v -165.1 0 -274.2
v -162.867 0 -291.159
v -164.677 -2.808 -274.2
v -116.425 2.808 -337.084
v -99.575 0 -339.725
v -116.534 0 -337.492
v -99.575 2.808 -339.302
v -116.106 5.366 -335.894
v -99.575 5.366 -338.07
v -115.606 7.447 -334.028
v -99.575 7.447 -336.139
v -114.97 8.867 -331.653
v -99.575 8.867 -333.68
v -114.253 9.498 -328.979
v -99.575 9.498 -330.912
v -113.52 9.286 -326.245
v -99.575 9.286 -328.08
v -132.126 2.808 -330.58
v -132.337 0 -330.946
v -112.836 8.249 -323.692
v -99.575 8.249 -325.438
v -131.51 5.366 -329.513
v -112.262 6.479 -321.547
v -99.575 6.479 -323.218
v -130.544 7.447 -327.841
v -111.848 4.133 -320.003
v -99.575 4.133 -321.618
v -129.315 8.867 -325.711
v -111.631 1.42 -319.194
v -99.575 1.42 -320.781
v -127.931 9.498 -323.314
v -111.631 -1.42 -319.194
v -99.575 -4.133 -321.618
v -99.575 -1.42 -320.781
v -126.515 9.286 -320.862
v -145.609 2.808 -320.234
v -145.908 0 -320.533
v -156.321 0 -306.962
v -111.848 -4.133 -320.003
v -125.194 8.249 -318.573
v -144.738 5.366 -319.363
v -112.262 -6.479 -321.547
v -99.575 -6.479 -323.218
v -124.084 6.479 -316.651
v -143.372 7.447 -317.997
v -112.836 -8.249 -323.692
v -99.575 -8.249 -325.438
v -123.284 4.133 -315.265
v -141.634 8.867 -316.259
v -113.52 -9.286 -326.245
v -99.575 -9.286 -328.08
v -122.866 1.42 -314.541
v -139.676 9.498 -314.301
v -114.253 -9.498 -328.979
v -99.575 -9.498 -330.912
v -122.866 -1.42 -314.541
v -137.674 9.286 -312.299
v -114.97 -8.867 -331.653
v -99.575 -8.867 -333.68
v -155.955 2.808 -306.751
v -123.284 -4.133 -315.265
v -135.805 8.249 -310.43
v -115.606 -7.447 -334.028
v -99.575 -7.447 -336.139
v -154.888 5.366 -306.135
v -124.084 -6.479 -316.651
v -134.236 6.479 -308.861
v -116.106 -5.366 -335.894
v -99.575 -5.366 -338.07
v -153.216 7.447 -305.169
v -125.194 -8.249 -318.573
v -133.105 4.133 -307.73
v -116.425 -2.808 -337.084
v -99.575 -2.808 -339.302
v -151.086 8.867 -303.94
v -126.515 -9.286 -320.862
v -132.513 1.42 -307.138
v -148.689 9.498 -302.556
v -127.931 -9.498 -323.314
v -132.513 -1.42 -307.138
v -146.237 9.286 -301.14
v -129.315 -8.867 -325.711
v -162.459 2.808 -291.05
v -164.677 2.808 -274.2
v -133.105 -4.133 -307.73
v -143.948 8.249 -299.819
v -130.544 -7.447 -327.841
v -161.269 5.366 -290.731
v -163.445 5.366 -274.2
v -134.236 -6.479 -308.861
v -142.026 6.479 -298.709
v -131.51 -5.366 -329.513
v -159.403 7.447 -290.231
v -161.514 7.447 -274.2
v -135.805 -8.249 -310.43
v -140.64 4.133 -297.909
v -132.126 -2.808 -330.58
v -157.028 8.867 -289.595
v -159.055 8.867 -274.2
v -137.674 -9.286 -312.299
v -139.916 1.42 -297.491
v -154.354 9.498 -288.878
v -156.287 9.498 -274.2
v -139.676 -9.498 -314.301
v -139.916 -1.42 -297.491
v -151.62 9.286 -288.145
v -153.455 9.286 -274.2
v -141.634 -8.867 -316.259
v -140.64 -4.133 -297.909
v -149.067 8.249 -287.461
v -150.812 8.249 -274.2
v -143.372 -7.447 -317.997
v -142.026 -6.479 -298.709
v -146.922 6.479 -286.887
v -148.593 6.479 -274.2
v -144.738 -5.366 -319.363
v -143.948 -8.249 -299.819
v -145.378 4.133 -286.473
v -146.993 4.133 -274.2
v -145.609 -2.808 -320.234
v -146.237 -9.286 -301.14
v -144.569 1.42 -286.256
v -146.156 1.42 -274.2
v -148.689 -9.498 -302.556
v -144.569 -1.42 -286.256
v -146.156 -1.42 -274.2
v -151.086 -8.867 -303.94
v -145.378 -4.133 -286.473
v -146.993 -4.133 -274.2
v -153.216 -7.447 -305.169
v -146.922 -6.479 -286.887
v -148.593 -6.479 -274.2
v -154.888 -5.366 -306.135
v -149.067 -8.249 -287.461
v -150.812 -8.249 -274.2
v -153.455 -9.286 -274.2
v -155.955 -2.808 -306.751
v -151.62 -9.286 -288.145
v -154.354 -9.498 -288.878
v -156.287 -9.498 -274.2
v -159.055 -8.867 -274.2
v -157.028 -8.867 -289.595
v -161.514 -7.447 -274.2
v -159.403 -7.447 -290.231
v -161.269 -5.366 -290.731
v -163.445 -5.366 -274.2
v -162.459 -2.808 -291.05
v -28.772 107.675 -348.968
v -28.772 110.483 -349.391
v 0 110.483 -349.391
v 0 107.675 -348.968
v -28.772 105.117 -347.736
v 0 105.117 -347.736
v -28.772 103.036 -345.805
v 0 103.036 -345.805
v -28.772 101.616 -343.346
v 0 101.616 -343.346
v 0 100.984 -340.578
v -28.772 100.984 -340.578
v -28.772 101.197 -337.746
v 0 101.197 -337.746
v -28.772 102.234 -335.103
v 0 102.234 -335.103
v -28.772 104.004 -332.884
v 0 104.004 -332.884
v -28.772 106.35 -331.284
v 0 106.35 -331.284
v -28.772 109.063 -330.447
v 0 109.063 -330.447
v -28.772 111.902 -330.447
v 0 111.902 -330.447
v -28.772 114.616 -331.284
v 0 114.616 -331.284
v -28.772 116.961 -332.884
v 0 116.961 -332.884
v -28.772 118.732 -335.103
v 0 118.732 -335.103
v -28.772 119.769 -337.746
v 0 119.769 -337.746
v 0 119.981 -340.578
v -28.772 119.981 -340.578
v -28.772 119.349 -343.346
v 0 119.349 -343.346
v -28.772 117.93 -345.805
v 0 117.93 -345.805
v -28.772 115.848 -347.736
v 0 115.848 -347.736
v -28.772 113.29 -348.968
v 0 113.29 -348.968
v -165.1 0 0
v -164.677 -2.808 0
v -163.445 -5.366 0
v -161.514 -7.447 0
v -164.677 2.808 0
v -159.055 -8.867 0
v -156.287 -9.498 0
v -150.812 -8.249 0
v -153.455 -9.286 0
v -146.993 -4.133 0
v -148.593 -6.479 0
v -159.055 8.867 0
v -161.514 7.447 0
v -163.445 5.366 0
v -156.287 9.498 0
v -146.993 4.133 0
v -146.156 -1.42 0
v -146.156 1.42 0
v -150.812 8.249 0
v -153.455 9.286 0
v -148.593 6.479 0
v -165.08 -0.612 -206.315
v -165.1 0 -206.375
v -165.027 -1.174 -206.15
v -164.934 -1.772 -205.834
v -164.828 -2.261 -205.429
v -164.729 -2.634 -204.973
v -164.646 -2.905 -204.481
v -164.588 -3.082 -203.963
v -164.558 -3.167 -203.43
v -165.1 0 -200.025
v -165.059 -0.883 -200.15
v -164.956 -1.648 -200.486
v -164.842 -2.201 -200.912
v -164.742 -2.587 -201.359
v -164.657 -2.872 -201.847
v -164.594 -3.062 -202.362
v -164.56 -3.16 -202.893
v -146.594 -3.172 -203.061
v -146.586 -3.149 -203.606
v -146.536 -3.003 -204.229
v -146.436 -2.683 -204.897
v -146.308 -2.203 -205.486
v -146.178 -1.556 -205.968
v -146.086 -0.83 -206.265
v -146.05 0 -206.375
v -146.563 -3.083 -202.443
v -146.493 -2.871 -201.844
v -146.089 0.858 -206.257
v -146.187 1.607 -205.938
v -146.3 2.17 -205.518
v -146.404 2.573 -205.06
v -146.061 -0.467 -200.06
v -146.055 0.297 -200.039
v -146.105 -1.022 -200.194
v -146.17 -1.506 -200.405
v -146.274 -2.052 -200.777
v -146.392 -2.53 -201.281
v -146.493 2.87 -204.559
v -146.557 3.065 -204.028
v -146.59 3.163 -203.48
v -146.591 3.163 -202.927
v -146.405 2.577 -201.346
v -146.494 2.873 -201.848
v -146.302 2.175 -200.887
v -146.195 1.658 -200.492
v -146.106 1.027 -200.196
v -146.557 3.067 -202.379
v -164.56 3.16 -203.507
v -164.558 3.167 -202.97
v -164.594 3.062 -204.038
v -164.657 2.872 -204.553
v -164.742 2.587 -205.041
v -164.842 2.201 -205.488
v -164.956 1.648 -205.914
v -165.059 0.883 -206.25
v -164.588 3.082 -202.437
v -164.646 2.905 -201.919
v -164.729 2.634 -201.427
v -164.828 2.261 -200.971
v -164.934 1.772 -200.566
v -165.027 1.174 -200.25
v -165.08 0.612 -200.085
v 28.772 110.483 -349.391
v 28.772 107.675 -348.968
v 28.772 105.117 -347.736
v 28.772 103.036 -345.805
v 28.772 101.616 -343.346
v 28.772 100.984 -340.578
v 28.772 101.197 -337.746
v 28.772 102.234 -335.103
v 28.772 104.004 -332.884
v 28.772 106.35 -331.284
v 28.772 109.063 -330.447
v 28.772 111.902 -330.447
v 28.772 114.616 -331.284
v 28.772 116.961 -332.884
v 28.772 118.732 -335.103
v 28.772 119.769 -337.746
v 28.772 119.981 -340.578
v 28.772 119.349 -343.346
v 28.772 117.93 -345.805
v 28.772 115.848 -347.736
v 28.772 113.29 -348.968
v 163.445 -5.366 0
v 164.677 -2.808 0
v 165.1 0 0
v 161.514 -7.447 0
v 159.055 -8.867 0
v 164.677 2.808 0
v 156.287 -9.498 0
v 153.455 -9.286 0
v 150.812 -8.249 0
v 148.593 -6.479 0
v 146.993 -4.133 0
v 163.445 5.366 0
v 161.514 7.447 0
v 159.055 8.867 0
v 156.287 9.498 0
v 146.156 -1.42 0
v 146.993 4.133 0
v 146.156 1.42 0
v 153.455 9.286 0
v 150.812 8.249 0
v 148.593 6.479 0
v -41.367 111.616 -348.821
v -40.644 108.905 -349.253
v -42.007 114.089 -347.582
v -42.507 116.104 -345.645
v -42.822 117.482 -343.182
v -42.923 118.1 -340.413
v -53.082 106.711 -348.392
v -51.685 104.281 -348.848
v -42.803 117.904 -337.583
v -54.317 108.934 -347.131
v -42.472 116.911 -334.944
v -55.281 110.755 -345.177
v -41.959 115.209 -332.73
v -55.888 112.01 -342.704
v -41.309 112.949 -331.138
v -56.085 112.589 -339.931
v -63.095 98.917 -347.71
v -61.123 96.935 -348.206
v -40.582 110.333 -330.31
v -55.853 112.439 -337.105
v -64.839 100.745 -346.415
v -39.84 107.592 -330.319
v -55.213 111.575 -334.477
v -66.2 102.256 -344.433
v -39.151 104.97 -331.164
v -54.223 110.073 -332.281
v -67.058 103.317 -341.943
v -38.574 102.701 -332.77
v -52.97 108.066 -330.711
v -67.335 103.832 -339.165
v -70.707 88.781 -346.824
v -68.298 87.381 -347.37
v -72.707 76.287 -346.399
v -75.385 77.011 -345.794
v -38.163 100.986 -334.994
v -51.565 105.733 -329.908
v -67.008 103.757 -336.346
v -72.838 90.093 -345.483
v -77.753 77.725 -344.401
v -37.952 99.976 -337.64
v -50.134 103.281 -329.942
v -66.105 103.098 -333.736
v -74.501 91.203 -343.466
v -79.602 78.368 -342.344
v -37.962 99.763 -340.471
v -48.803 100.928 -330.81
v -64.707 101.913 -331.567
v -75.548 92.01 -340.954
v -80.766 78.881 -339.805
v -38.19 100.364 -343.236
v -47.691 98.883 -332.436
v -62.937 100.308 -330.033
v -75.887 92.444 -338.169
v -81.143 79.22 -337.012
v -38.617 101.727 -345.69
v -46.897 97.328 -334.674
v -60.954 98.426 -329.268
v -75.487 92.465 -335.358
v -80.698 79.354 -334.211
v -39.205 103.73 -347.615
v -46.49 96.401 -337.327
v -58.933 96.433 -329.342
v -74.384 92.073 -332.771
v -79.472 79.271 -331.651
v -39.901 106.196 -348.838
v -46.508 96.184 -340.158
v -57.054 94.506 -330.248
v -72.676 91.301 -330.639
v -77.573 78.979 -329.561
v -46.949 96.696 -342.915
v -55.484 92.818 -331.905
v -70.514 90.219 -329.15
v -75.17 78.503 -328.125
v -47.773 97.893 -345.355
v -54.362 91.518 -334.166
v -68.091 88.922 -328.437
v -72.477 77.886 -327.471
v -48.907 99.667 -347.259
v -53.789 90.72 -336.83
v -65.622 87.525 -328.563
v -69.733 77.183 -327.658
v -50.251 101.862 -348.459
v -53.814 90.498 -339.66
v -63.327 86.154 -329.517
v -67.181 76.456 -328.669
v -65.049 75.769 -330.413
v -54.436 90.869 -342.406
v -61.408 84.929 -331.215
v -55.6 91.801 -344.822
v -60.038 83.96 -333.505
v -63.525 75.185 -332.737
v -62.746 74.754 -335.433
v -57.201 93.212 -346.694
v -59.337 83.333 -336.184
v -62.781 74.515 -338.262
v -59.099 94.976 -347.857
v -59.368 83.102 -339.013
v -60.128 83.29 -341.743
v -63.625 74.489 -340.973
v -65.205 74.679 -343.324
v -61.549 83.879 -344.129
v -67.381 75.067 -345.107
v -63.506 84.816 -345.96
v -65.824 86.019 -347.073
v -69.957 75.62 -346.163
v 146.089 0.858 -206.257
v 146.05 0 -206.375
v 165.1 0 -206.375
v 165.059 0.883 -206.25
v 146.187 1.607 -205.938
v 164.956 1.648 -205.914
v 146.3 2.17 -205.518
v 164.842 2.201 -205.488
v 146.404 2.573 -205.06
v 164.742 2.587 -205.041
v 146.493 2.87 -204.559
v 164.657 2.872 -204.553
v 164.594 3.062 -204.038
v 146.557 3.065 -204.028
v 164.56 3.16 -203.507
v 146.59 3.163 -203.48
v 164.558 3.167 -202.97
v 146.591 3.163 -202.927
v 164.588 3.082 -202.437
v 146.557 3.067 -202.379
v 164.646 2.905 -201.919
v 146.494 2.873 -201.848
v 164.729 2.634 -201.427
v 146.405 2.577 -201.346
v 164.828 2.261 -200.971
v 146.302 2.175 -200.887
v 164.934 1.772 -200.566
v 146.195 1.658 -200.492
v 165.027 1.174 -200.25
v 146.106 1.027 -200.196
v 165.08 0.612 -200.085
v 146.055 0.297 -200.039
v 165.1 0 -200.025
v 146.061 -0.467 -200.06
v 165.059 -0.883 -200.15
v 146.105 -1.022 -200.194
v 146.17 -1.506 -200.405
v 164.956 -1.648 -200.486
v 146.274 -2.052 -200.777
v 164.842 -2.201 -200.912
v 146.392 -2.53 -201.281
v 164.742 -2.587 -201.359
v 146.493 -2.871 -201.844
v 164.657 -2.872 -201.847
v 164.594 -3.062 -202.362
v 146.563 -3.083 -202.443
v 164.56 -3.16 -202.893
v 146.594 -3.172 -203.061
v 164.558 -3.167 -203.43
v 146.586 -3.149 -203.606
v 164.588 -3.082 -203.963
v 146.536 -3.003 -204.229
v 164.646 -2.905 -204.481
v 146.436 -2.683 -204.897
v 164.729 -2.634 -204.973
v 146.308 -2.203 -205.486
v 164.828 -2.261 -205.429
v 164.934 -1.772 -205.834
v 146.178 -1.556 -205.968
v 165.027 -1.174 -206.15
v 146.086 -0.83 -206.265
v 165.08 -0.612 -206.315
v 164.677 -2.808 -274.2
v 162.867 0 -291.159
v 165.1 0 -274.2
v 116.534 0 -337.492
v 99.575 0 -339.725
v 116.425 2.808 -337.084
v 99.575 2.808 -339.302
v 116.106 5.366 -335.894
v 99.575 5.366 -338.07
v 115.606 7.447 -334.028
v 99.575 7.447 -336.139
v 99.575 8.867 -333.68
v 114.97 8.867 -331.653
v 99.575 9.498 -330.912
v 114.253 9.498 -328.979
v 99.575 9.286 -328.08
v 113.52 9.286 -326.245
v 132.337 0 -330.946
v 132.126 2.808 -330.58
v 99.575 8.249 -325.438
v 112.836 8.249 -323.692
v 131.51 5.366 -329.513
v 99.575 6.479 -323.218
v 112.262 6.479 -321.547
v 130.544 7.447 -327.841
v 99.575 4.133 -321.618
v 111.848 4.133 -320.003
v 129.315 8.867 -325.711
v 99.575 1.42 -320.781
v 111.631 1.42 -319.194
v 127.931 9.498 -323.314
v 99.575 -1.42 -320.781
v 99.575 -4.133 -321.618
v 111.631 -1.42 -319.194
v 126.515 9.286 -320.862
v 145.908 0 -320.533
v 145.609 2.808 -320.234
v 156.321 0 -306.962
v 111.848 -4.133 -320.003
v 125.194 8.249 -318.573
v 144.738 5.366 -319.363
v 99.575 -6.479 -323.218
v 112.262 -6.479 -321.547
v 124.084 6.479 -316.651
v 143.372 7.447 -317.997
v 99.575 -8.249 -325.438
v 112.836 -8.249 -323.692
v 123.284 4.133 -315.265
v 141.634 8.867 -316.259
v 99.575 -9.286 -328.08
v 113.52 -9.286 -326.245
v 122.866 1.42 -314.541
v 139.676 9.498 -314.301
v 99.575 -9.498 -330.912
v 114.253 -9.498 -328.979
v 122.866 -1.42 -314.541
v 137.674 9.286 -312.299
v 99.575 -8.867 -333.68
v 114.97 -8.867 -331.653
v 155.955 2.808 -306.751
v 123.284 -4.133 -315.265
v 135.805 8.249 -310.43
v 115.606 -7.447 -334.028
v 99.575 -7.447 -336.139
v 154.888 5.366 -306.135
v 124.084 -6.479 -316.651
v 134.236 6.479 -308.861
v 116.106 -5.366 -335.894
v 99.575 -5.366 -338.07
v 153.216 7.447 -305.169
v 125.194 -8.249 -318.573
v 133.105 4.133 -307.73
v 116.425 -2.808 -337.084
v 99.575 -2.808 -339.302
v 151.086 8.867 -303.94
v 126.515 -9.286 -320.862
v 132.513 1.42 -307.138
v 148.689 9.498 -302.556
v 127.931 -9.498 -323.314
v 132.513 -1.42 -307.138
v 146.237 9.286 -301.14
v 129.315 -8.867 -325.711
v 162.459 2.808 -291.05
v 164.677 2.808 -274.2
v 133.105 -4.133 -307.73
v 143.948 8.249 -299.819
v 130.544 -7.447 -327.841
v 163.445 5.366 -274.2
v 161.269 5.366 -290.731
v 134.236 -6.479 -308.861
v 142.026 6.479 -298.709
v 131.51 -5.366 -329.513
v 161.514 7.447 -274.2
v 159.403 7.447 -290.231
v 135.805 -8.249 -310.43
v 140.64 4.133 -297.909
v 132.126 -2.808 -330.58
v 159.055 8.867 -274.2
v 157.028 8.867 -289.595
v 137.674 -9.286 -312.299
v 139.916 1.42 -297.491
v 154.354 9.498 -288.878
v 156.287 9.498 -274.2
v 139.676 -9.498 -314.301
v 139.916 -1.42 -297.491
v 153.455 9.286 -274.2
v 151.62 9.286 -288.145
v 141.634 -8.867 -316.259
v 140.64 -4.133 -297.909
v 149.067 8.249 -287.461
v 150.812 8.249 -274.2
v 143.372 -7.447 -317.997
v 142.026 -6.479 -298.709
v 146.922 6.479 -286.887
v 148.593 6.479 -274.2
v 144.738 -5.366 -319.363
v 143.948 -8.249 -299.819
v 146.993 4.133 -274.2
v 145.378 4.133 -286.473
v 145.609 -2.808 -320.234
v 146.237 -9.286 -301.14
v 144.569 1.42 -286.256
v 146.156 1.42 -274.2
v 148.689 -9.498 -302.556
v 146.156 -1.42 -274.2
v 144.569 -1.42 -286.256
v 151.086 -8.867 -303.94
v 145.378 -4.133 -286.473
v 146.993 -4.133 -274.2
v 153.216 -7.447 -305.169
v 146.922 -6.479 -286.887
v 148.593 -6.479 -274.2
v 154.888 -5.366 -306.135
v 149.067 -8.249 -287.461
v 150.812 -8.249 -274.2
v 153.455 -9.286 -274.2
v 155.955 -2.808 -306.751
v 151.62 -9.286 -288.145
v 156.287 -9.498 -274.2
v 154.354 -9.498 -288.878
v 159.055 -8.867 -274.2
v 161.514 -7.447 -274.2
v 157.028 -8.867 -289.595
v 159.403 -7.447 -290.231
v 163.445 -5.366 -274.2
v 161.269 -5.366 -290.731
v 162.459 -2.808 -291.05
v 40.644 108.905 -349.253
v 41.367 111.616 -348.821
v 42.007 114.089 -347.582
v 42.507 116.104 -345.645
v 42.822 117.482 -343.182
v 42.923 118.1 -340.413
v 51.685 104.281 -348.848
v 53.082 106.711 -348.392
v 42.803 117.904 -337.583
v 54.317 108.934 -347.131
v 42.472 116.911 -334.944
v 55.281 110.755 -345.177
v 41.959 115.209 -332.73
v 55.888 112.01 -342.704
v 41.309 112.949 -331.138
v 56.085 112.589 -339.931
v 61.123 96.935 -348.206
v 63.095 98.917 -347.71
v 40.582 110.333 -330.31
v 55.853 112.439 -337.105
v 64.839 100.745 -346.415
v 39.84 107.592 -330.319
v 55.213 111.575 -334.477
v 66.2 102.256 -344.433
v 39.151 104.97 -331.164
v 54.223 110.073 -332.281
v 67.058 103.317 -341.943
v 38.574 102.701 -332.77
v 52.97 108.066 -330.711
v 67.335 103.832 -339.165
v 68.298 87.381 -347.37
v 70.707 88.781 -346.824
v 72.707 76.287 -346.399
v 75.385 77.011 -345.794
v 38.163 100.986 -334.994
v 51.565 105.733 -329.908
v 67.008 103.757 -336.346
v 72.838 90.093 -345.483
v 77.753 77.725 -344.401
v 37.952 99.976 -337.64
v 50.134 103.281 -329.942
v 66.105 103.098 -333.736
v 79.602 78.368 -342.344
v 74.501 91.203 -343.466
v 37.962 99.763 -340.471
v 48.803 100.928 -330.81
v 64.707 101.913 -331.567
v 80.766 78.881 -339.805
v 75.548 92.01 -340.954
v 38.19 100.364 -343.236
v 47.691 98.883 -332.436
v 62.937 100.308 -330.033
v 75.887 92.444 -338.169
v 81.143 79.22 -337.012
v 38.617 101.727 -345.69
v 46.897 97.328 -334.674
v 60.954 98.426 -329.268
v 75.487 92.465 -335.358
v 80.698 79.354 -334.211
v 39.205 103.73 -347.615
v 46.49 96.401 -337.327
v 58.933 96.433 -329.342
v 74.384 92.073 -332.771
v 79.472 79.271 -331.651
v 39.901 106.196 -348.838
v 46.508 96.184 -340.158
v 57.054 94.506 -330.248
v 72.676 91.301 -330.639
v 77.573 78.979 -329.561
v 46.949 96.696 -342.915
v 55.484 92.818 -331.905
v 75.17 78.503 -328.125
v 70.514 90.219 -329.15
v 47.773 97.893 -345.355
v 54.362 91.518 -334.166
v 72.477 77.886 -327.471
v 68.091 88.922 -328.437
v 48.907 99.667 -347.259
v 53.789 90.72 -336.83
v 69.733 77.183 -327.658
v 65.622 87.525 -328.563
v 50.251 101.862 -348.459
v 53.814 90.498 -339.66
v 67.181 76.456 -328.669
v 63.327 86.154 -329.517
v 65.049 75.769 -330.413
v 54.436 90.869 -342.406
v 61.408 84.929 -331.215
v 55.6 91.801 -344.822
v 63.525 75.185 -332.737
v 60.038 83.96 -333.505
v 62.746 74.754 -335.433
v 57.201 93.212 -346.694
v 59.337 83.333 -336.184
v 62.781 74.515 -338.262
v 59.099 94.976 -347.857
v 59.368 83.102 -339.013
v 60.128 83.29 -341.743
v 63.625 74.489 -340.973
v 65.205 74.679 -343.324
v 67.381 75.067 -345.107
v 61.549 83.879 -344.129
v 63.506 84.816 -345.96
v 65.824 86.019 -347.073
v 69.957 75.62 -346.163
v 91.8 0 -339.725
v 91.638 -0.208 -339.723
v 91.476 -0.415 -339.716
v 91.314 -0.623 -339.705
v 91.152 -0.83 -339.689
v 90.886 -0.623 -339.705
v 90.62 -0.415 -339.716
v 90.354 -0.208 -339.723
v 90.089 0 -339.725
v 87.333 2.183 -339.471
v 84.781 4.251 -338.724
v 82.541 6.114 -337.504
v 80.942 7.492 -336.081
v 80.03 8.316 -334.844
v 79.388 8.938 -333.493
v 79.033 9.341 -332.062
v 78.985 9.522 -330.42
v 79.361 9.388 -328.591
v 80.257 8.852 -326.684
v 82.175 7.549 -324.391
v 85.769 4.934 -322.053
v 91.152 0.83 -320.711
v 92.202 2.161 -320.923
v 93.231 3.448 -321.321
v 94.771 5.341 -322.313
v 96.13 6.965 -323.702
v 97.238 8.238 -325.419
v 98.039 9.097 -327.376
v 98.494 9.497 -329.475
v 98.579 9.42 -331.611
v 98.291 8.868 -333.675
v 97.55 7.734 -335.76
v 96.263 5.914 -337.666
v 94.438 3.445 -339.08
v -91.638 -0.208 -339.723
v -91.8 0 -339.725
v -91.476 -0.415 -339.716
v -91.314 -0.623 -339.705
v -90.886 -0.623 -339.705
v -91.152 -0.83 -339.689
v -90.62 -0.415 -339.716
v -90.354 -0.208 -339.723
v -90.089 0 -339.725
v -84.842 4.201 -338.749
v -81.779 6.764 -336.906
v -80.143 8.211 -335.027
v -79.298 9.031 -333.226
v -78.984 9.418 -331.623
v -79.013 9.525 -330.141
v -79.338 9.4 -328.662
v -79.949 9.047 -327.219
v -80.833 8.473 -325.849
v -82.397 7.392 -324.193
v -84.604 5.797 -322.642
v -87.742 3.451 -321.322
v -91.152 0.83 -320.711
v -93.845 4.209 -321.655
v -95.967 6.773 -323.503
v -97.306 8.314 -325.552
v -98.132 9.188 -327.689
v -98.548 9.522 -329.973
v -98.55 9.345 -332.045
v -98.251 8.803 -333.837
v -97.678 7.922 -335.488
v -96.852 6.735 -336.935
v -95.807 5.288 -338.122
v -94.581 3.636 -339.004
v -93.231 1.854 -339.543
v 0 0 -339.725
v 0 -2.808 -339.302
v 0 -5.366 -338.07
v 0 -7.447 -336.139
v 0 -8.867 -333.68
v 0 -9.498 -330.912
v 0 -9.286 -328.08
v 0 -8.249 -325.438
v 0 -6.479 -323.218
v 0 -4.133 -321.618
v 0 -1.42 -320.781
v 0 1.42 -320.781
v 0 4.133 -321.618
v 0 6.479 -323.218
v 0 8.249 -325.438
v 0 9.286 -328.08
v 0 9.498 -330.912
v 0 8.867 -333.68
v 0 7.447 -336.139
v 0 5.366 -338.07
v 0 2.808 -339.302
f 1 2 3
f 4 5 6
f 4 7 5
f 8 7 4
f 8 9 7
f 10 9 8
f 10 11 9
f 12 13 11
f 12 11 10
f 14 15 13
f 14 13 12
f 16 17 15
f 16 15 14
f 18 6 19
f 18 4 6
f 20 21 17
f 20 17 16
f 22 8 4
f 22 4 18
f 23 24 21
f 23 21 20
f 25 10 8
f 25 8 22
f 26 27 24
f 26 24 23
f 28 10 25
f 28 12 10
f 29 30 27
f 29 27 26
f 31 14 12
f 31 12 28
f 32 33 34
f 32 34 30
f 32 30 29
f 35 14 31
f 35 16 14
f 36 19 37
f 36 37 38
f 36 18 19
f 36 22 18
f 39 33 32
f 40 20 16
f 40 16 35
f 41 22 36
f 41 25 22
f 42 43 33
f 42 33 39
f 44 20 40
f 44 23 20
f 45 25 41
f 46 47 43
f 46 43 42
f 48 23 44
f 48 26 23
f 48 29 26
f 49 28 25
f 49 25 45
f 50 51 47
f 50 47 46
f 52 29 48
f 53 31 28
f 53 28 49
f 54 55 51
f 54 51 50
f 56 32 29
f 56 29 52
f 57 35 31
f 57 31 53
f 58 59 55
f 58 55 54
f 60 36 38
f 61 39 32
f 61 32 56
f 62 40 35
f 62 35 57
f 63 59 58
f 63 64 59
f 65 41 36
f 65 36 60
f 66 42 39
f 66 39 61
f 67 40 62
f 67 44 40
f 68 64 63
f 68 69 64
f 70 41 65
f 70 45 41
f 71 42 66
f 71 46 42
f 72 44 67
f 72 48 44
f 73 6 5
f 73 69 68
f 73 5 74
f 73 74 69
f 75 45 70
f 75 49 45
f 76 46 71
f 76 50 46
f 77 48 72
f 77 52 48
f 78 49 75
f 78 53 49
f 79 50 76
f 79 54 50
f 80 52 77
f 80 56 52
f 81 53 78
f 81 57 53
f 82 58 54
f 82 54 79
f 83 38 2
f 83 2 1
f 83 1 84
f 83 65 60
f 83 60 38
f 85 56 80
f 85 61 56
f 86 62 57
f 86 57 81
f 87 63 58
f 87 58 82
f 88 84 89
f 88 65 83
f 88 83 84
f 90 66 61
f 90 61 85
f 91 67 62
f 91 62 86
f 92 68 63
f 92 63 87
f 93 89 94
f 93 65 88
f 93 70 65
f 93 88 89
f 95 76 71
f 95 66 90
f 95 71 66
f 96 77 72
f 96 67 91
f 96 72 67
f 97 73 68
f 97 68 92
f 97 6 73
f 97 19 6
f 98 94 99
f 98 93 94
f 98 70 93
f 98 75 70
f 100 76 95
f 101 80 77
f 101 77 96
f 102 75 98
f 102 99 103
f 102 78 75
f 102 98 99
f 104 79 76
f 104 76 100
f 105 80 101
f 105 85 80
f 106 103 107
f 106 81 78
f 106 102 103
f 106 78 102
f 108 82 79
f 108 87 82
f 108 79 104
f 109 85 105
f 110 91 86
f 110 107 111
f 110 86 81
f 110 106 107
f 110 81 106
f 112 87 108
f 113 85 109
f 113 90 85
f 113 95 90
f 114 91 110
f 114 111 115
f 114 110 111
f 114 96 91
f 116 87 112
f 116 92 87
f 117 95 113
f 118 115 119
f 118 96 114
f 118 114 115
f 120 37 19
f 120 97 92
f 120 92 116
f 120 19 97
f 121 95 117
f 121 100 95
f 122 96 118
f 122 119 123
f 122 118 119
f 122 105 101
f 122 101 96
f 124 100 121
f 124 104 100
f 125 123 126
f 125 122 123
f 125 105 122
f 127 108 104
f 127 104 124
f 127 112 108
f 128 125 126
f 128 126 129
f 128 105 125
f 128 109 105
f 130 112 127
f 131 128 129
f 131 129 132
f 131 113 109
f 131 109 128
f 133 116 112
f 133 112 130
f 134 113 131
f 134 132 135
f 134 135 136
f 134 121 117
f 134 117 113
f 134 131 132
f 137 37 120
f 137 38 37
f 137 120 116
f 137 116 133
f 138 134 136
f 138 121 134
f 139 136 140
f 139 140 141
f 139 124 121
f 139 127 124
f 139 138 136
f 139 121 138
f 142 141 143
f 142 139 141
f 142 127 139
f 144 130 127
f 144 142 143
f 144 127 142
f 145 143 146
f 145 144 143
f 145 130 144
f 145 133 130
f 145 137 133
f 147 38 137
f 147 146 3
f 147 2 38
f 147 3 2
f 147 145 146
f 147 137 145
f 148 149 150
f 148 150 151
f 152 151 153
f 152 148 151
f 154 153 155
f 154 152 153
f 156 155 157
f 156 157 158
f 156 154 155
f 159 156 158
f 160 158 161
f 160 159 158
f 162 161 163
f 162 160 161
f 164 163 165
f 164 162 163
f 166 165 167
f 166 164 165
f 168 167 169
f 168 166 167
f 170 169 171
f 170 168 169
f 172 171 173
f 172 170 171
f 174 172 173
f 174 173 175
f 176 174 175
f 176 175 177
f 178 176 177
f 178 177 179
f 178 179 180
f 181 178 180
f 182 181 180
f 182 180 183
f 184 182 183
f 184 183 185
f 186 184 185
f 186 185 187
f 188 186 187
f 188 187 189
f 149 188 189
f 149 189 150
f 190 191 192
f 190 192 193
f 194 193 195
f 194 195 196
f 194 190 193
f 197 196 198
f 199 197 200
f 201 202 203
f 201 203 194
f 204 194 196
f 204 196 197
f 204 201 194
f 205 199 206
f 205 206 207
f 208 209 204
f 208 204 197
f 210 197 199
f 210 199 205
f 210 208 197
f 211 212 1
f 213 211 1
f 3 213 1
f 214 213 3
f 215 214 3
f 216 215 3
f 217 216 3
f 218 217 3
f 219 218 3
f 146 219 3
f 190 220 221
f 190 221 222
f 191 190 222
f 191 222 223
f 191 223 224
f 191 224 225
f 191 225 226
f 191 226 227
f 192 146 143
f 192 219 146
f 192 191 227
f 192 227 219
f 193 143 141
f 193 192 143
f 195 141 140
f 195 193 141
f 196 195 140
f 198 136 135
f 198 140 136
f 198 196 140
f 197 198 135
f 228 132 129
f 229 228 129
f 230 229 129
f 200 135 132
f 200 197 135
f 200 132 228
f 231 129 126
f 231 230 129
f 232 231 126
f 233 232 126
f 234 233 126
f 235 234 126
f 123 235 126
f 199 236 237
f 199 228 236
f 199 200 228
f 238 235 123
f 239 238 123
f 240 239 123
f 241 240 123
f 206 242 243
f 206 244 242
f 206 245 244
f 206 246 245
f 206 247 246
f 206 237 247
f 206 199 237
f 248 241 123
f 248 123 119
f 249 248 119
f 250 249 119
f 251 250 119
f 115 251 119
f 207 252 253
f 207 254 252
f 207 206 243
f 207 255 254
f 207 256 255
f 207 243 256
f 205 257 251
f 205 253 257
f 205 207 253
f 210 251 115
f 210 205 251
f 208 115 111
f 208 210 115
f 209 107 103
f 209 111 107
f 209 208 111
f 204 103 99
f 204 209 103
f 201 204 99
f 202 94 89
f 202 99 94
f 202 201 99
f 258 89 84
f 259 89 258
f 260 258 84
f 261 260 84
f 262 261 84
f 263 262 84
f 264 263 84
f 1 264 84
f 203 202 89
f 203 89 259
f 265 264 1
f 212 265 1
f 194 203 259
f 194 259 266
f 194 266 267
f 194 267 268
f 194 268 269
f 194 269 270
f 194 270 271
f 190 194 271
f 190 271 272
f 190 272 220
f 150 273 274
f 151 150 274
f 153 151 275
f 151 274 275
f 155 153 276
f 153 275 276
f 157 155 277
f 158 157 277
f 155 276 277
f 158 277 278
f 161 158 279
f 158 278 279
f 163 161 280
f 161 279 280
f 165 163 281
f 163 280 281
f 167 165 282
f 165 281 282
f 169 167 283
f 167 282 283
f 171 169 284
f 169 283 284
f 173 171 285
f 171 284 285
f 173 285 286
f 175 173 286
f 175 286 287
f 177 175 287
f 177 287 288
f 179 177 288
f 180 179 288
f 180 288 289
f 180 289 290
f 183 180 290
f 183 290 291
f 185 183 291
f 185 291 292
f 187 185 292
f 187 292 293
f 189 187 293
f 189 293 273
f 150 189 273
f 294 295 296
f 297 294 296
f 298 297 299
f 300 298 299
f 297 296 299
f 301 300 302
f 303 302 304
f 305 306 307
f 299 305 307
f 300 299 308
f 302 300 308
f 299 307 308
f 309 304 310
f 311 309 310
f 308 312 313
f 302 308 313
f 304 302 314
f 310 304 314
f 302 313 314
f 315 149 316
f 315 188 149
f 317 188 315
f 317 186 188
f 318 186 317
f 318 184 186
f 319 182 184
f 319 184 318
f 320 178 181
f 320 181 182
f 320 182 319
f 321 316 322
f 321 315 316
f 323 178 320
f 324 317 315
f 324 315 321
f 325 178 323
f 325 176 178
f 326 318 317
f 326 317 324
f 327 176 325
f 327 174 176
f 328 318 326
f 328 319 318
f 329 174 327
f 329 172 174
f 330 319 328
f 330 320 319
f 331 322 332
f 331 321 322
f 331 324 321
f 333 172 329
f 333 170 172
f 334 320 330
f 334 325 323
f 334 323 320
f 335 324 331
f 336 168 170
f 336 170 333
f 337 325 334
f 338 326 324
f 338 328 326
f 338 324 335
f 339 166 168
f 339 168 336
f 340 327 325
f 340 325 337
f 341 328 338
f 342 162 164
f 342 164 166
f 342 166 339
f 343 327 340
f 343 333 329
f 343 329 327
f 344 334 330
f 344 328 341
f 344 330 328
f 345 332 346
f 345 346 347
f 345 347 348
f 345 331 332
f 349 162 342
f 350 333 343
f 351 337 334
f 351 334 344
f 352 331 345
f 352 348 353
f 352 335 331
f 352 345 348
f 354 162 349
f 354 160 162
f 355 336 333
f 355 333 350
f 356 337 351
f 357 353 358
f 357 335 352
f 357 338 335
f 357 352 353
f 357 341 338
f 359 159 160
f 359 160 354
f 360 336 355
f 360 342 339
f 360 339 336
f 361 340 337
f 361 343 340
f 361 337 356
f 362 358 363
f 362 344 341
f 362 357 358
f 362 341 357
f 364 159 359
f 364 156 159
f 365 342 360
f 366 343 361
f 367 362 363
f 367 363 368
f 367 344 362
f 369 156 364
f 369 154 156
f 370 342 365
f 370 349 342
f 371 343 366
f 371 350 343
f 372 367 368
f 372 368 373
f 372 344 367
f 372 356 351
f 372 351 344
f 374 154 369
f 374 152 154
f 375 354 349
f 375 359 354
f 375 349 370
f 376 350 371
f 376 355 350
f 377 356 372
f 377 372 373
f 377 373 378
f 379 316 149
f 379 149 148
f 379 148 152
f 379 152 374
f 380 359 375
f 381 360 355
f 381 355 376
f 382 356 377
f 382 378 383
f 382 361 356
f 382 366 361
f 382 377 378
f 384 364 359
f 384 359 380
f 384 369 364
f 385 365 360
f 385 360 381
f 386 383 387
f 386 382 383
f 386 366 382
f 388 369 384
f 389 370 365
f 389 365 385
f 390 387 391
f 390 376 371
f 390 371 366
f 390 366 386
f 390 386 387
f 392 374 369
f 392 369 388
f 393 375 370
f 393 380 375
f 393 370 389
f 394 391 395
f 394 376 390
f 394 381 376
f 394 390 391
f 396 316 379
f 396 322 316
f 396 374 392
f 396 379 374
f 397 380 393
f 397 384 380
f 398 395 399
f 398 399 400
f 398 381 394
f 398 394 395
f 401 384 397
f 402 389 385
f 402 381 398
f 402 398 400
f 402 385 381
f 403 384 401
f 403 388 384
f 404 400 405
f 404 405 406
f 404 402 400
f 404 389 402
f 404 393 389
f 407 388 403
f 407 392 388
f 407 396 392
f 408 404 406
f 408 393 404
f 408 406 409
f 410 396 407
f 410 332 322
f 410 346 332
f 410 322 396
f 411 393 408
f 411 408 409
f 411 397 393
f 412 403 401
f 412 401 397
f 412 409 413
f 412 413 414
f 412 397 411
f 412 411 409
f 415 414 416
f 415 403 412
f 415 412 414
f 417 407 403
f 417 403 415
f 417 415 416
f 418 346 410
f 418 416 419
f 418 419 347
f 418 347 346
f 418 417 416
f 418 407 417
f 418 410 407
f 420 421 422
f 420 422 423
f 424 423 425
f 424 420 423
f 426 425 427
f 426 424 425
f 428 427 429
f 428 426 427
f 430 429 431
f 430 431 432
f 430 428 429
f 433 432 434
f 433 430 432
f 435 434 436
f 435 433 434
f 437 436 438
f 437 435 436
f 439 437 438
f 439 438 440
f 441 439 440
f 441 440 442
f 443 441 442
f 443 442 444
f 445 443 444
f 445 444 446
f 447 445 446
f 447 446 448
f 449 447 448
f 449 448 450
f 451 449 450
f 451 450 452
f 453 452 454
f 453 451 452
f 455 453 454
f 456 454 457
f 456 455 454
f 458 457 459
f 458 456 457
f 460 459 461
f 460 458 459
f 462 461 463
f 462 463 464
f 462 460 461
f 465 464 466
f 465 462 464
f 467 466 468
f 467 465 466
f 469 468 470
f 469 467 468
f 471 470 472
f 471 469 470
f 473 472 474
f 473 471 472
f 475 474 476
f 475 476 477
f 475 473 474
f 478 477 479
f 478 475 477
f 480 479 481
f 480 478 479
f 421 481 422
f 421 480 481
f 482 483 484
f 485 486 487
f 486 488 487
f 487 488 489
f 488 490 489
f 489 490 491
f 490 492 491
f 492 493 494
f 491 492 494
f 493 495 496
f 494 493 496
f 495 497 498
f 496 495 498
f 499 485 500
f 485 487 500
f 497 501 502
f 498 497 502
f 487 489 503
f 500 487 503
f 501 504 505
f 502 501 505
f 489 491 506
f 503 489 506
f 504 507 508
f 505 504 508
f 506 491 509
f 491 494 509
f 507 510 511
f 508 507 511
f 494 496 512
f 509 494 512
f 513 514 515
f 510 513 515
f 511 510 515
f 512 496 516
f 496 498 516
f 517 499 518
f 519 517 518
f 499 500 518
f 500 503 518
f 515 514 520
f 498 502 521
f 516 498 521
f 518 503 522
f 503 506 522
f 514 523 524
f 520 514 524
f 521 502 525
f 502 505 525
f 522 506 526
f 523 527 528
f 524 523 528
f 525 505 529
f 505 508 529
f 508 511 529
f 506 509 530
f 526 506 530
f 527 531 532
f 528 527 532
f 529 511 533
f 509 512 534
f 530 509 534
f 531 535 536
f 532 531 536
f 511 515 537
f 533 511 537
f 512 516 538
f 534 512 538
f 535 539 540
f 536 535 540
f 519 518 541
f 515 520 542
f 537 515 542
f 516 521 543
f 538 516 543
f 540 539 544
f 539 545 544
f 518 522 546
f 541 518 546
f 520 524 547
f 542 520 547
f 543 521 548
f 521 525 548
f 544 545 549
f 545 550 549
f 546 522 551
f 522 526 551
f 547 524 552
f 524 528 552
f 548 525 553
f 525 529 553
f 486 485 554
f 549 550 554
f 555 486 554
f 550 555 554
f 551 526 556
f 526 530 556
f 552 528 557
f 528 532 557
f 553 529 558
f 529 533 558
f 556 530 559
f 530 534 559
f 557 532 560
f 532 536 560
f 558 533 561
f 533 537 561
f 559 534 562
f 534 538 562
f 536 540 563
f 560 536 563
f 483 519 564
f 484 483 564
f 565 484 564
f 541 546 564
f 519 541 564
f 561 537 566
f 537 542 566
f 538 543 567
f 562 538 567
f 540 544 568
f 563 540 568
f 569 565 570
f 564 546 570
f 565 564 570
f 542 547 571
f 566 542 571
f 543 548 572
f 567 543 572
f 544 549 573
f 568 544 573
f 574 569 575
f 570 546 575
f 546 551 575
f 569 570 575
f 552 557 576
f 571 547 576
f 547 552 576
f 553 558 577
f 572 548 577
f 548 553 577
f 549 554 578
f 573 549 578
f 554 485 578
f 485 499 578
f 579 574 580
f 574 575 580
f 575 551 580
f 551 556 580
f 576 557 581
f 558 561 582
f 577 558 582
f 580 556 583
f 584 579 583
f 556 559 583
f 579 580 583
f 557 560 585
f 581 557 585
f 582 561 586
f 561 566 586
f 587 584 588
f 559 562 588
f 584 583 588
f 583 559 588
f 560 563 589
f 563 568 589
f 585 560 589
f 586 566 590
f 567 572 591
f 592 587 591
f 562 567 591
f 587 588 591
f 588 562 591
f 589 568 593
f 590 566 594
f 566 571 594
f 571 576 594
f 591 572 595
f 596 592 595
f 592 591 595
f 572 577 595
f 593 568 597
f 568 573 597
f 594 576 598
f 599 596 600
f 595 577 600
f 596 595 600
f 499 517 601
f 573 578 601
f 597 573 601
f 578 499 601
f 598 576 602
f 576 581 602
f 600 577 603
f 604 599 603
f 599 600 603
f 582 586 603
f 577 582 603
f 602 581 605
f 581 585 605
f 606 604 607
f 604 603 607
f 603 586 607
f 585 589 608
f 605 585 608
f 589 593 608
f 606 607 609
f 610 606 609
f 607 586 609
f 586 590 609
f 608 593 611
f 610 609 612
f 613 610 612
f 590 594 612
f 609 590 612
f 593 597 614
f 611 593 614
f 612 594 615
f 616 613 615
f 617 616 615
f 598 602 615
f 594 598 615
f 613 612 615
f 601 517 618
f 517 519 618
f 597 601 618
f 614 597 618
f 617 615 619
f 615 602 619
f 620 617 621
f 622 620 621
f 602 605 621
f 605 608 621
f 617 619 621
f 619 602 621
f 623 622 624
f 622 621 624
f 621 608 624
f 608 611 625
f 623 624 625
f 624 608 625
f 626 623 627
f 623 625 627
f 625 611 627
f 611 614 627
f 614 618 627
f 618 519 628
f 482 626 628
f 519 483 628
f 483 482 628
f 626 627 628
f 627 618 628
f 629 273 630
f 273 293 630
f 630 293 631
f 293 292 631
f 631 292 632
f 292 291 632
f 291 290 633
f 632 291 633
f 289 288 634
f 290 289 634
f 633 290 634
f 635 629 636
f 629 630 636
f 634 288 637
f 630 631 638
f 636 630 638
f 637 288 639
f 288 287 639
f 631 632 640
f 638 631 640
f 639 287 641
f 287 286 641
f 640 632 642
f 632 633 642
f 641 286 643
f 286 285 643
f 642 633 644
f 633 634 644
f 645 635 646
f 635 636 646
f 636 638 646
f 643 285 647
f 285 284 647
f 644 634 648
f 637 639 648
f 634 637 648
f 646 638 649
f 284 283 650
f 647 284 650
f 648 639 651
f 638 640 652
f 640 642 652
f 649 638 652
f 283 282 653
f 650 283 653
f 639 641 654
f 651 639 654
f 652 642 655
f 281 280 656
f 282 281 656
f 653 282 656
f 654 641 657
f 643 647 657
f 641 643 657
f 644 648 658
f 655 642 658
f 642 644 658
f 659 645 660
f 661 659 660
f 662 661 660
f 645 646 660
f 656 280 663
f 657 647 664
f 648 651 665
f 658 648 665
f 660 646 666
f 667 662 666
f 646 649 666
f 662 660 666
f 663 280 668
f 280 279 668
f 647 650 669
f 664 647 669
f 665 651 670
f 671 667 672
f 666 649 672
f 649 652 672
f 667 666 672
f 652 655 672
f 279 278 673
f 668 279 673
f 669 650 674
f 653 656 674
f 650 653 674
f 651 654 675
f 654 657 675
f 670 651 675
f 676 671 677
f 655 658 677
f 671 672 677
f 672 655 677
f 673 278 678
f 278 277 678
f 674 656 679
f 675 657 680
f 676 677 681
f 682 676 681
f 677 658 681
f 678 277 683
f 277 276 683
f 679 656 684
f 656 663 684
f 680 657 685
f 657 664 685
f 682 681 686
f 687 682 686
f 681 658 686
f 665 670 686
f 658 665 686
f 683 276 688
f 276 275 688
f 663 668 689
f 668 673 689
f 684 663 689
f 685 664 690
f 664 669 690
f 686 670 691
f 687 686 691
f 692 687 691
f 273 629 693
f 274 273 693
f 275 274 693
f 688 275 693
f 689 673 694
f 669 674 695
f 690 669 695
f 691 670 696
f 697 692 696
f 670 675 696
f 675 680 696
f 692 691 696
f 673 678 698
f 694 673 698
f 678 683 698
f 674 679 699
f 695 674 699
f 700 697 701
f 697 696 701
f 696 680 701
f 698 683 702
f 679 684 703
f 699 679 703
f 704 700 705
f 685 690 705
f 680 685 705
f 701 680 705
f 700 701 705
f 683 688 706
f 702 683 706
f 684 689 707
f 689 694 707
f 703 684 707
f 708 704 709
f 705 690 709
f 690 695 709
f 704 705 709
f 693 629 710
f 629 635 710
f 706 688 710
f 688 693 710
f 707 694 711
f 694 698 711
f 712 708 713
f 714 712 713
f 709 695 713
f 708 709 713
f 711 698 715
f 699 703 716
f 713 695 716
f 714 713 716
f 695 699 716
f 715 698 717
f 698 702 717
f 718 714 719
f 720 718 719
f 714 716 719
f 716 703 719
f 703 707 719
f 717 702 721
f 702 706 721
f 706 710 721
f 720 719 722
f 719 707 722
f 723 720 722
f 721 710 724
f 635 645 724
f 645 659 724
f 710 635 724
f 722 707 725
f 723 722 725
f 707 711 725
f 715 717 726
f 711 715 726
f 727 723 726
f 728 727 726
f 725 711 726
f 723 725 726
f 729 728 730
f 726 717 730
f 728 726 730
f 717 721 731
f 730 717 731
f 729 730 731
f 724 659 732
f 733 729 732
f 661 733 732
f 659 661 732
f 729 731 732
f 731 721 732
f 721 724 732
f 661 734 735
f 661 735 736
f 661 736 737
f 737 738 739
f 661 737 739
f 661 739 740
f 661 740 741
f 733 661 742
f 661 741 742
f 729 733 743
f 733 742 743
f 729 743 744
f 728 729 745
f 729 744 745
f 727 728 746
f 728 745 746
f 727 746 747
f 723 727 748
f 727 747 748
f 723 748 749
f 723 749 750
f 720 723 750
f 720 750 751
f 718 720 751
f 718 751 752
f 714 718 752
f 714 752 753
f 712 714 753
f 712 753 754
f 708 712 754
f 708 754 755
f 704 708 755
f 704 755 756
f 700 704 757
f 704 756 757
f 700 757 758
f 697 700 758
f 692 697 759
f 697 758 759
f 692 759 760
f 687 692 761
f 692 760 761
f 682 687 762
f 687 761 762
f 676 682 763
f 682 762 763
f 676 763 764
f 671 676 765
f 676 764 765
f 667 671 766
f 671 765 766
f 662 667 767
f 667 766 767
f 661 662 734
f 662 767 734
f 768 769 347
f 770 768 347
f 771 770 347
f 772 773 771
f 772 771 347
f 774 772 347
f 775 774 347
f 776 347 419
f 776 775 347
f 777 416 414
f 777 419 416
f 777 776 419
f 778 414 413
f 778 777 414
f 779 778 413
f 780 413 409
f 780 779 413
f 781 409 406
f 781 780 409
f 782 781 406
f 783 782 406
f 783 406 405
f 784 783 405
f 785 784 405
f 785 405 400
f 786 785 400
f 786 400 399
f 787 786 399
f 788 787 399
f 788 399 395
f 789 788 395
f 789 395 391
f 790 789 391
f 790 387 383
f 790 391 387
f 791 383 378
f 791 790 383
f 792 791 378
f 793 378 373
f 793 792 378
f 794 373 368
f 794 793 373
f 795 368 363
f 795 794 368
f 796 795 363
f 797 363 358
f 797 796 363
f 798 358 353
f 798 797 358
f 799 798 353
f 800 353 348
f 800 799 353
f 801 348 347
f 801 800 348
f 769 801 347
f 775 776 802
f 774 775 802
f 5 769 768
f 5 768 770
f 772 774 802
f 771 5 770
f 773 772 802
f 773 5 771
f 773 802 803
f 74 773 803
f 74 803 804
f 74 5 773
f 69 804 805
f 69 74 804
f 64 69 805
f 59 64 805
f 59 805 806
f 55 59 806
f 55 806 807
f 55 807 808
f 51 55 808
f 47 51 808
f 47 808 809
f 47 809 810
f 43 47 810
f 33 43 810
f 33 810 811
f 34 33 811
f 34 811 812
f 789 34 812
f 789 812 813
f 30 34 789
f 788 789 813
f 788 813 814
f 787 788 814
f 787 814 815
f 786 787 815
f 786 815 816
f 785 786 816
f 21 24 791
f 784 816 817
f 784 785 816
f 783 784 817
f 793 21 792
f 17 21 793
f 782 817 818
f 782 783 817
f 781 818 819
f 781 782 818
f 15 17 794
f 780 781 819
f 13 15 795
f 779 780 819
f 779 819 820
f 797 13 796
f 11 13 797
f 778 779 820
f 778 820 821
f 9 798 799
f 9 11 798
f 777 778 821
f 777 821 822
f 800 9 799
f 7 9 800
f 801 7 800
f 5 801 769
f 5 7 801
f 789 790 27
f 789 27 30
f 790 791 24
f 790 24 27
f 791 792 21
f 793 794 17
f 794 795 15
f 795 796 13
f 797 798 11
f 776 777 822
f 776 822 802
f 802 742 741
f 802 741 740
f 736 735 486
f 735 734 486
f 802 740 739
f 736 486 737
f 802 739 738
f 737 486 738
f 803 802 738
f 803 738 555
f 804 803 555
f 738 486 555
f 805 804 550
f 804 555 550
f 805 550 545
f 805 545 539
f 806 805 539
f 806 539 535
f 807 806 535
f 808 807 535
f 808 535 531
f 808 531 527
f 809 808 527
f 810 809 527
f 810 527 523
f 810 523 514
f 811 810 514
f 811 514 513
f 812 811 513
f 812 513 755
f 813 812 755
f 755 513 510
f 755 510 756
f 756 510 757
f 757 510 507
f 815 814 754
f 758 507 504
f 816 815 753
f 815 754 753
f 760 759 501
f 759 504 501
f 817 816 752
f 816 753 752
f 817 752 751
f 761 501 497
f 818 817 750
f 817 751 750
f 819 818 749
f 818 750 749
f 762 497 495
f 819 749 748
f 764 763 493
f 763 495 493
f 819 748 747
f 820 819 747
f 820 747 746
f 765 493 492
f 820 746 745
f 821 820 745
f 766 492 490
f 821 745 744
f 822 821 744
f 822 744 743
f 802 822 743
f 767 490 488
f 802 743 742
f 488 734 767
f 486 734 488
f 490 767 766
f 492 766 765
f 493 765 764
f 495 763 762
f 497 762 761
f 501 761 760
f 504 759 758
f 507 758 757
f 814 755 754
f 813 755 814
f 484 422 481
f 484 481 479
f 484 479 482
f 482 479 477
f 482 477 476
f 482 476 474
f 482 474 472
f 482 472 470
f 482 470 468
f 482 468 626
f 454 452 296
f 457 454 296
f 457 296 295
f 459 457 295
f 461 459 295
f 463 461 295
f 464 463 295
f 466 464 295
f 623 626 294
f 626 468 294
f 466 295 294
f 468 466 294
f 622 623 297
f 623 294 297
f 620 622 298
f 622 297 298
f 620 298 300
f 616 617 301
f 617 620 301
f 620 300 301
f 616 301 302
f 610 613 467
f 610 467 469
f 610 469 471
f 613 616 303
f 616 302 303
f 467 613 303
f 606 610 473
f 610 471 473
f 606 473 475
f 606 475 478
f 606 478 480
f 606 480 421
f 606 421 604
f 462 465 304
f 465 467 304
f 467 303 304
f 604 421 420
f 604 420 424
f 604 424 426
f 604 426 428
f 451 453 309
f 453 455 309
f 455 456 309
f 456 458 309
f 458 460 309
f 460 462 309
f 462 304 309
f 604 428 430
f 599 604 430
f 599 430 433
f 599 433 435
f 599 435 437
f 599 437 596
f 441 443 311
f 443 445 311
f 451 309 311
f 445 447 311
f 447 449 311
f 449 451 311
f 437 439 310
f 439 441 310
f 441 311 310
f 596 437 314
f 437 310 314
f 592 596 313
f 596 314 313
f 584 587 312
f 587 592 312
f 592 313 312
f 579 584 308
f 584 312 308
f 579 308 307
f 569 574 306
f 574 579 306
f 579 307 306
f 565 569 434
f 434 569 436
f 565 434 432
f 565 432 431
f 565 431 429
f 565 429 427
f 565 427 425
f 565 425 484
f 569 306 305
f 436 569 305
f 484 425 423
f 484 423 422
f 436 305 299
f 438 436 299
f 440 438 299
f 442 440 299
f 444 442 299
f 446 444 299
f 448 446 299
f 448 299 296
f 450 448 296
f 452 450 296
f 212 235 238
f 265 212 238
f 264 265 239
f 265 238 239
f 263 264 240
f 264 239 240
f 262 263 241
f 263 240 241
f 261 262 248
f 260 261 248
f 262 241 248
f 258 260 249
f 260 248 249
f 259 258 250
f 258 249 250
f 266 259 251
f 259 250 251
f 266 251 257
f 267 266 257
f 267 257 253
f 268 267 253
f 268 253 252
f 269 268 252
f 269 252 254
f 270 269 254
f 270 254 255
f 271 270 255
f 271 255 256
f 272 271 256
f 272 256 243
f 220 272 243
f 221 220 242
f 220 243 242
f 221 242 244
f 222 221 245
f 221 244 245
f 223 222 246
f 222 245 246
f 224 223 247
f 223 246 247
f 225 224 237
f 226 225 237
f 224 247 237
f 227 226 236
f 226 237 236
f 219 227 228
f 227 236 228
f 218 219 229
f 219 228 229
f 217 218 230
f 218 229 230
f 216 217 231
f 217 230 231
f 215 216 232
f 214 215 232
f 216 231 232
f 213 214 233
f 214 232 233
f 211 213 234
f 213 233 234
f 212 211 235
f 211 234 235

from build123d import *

# Parameters (mm, degrees)
SWEEP1_PROFILE_R   = 9.525
SWEEP2_PROFILE_R   = 9.525
SKETCH37_R         = 3.175
CUT_EXTRUDE1_DEPTH = 405.640507596


with BuildPart() as part:
    # Sweep1: sweep along a path in Sketch2
    with BuildLine(Plane(origin=(0, -28.669314133, -327.691760022), x_dir=(-1, 0, 0), z_dir=(0, 0.08715574274765835, 0.9961946980917455))) as sweep1_path:
        Line((0, -139.683627769), (28.771853902, -139.683627769))
        ThreePointArc((28.771853902, -139.683627769), (56.13800648, -130.260705766), (71.901498935, -105.987056028))
        Line((71.901498935, -105.987056028), (91.151672667, -28.778826255))
    # Sweep1 profile (on start of the path) → Sweep1 (sweep)
    with BuildSketch(Plane(origin=(0, 110.482775261, -339.86599035), x_dir=(0, 0, -1), z_dir=(-1, 0, 0))):
        Circle(SWEEP1_PROFILE_R)
    sweep1 = sweep(path=sweep1_path.line)

    # Sweep2: sweep along a path in Sketch1
    with BuildLine(Plane(origin=(0, 0, 0), x_dir=(1, 0, 0), z_dir=(0, 1, 0))) as sweep2_path:
        Line((0, 330.2), (-99.575, 330.2))
        ThreePointArc((-99.575, 330.2), (-139.172979746, 313.797979746), (-155.575, 274.2))
        Line((-155.575, 274.2), (-155.575, 0))
    # Sweep2 profile (on start of the path) → Sweep2 (sweep)
    with BuildSketch(Plane(origin=(0, 0, -330.2), x_dir=(0, 0, -1), z_dir=(-1, 0, 0))):
        Circle(SWEEP2_PROFILE_R)
    sweep2 = sweep(path=sweep2_path.line)

    # Sketch37 → Cut-Extrude1 (cut, through all)
    with BuildSketch(Plane(origin=(0, 0, 0), x_dir=(0, 0, -1), z_dir=(1, 0, 0))):
        with Locations((203.2, 0)):
            Circle(SKETCH37_R)
    cut_extrude1 = extrude(amount=-CUT_EXTRUDE1_DEPTH, mode=Mode.SUBTRACT)

    # Mirror1: Sweep1, Sweep2, Cut-Extrude1 across plane
    add(sweep1.mirror(Plane(origin=(0, 0, 0), x_dir=(0, 0, 1), z_dir=(1, 0, 0))))
    add(sweep2.mirror(Plane(origin=(0, 0, 0), x_dir=(0, 0, 1), z_dir=(1, 0, 0))))
    add(cut_extrude1.mirror(Plane(origin=(0, 0, 0), x_dir=(0, 0, 1), z_dir=(1, 0, 0))), mode=Mode.SUBTRACT)


solid = part.part
